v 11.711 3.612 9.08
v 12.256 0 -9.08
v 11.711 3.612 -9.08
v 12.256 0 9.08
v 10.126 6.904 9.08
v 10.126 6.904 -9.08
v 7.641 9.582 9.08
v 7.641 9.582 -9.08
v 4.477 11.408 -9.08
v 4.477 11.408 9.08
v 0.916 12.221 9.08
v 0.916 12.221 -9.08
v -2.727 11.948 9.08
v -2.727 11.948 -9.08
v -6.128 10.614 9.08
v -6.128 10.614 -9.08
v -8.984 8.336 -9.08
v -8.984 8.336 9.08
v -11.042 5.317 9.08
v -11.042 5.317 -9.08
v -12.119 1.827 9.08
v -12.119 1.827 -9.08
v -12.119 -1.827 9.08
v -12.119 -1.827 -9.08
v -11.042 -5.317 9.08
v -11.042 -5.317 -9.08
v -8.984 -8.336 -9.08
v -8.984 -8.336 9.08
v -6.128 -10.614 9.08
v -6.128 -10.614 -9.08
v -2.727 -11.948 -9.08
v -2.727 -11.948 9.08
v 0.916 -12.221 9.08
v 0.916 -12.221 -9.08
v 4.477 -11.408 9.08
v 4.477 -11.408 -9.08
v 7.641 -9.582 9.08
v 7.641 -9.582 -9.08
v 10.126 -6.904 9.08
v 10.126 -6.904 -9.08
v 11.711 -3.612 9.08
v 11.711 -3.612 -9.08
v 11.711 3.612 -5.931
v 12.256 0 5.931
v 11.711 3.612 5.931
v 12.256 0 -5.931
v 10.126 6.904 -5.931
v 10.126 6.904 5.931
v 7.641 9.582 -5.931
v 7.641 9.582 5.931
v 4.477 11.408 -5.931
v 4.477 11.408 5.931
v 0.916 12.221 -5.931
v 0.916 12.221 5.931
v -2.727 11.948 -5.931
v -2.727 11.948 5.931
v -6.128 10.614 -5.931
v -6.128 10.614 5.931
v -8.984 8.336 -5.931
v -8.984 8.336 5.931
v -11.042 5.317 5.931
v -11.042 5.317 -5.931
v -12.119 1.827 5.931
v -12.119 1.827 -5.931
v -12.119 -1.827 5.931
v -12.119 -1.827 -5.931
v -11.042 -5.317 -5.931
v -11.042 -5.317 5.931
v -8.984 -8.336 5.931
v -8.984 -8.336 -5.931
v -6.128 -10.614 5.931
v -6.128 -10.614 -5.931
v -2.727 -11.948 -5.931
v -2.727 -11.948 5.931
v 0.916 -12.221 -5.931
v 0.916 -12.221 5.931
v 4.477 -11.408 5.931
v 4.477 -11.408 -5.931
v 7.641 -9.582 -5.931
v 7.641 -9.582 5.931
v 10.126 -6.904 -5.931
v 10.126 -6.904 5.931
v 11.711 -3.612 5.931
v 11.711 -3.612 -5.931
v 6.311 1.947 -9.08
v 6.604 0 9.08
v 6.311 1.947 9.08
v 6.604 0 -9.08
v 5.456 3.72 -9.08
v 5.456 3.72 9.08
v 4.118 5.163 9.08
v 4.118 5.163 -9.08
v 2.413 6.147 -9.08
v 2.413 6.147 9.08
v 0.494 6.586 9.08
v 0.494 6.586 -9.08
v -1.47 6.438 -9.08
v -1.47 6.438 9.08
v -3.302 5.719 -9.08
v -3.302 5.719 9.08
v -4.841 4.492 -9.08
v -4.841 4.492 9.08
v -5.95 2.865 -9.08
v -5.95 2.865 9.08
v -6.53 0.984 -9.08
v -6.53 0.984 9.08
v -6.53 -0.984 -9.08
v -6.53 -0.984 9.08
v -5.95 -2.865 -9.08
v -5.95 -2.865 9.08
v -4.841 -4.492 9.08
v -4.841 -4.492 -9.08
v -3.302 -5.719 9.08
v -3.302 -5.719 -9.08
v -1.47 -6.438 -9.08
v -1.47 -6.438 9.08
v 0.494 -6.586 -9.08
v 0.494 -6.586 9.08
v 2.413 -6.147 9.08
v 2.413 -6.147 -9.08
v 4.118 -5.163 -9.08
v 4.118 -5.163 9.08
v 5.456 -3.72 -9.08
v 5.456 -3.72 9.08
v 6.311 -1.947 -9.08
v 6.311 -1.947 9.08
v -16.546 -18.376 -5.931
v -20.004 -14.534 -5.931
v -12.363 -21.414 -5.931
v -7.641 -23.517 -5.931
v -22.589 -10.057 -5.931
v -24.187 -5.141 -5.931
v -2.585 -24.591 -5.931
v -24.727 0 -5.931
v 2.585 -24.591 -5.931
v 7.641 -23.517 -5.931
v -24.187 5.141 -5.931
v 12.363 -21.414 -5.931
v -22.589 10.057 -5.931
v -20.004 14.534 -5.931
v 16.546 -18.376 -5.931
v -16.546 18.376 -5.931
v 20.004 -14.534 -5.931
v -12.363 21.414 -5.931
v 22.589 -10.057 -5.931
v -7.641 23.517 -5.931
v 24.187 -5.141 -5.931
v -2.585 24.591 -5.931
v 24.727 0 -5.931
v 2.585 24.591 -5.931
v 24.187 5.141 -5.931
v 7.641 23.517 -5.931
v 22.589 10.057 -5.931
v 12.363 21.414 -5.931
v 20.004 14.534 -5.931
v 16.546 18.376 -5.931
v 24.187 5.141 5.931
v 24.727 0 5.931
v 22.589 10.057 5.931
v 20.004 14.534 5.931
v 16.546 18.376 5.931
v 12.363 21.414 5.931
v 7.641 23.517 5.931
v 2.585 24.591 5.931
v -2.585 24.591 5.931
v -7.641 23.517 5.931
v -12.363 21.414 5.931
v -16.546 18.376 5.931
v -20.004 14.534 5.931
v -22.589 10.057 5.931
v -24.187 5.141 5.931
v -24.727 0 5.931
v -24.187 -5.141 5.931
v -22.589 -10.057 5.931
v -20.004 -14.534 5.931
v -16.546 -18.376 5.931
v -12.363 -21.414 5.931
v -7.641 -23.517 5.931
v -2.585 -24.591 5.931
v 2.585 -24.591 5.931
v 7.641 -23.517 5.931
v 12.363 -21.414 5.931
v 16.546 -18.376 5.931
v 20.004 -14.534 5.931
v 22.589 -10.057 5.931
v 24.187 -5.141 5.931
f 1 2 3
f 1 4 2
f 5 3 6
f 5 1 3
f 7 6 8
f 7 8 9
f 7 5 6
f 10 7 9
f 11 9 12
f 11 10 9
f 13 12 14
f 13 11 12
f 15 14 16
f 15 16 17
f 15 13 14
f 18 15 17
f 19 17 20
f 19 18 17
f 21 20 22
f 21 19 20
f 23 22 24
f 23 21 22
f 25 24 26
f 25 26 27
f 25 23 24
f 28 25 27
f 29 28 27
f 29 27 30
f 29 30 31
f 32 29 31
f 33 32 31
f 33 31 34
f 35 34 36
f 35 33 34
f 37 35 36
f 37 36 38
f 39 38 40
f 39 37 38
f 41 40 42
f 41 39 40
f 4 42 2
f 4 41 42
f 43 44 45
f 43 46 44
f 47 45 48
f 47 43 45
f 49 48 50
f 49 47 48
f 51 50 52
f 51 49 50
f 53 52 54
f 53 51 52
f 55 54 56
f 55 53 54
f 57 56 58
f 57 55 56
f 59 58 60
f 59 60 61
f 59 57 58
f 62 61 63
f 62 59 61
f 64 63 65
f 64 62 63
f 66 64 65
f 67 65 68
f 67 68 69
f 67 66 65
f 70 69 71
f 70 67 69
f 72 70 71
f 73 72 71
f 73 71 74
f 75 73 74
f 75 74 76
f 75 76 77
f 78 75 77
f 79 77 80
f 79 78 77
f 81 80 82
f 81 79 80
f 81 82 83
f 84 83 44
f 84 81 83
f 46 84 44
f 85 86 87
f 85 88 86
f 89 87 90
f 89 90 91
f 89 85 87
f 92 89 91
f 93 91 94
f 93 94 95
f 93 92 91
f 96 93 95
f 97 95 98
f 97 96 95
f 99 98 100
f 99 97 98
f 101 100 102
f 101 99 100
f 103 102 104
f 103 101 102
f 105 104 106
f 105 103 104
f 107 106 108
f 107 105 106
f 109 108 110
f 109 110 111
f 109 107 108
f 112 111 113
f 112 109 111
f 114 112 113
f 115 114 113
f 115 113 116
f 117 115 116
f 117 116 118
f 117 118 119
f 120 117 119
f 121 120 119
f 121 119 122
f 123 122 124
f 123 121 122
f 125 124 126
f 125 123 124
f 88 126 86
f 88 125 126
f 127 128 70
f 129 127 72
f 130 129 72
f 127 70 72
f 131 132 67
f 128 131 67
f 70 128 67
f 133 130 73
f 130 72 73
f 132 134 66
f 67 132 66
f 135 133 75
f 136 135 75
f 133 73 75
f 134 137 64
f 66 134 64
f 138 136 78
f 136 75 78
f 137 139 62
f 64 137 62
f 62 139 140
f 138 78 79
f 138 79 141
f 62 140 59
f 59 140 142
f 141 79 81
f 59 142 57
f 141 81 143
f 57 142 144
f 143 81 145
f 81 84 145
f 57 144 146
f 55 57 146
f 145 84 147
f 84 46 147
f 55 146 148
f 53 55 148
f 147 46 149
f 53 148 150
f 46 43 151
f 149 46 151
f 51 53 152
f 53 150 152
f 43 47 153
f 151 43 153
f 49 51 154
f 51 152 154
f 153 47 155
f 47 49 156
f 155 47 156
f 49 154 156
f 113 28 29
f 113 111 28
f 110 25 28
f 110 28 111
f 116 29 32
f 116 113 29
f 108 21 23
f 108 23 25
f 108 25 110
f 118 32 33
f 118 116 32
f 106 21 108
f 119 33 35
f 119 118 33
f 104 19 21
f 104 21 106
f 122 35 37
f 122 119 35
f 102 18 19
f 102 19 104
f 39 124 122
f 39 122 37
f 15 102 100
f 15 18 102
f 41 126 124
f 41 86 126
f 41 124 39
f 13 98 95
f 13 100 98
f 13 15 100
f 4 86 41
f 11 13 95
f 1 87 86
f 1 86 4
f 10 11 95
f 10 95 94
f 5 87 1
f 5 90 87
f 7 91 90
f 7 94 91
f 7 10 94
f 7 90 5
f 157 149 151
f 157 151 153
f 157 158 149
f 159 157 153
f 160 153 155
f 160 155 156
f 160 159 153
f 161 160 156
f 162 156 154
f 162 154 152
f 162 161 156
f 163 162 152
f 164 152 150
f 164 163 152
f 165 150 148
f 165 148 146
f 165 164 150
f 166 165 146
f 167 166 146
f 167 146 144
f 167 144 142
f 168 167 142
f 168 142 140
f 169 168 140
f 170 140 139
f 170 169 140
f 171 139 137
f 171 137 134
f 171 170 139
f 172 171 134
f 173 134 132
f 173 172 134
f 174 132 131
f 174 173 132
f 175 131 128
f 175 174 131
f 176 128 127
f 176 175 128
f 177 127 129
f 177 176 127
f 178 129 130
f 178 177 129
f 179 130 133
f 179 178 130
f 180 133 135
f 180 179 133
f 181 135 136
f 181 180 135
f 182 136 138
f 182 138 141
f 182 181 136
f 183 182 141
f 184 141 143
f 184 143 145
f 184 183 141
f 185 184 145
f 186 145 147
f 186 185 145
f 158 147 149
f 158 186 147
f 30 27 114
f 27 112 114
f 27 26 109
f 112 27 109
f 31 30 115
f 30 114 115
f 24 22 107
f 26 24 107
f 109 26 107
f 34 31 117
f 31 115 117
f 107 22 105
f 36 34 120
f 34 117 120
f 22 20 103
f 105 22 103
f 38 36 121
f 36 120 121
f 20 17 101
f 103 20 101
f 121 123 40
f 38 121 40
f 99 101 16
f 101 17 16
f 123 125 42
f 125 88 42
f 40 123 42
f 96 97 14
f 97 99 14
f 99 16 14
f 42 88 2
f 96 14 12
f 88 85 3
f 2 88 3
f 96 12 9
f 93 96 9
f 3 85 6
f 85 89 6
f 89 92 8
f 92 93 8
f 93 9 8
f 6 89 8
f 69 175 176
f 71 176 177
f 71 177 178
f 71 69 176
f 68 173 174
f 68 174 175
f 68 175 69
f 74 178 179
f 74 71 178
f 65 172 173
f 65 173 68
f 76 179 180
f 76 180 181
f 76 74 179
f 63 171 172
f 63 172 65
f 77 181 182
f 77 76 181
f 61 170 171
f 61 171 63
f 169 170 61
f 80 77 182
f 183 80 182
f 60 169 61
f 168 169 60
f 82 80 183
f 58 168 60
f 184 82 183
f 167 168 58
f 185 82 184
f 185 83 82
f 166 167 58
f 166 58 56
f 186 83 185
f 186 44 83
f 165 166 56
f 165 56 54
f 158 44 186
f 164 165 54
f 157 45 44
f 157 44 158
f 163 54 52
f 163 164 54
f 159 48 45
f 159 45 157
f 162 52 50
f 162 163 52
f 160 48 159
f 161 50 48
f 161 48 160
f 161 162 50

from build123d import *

# Parameters (mm, degrees)
SKETCH1_R           = 24.7269
SKETCH1_R_2         = 12.2555
BOSS_EXTRUDE1_DEPTH = 5.9309
SKETCH1_3_R         = 12.2555
SKETCH1_3_R_2       = 6.604
BOSS_EXTRUDE2_DEPTH = 9.0805


with BuildPart() as part:
    # Sketch1 → Boss-Extrude1 (new, symmetric)
    with BuildSketch(Plane.XY):
        Circle(SKETCH1_R)
        Circle(SKETCH1_R_2, mode=Mode.SUBTRACT)
    extrude(amount=BOSS_EXTRUDE1_DEPTH, both=True)


with BuildPart() as body_2:
    # Sketch1<3> → Boss-Extrude2 (new, symmetric)
    with BuildSketch(Plane.XY):
        Circle(SKETCH1_3_R)
        Circle(SKETCH1_3_R_2, mode=Mode.SUBTRACT)
    extrude(amount=BOSS_EXTRUDE2_DEPTH, both=True)


solid = Compound([part.part, body_2.part])
